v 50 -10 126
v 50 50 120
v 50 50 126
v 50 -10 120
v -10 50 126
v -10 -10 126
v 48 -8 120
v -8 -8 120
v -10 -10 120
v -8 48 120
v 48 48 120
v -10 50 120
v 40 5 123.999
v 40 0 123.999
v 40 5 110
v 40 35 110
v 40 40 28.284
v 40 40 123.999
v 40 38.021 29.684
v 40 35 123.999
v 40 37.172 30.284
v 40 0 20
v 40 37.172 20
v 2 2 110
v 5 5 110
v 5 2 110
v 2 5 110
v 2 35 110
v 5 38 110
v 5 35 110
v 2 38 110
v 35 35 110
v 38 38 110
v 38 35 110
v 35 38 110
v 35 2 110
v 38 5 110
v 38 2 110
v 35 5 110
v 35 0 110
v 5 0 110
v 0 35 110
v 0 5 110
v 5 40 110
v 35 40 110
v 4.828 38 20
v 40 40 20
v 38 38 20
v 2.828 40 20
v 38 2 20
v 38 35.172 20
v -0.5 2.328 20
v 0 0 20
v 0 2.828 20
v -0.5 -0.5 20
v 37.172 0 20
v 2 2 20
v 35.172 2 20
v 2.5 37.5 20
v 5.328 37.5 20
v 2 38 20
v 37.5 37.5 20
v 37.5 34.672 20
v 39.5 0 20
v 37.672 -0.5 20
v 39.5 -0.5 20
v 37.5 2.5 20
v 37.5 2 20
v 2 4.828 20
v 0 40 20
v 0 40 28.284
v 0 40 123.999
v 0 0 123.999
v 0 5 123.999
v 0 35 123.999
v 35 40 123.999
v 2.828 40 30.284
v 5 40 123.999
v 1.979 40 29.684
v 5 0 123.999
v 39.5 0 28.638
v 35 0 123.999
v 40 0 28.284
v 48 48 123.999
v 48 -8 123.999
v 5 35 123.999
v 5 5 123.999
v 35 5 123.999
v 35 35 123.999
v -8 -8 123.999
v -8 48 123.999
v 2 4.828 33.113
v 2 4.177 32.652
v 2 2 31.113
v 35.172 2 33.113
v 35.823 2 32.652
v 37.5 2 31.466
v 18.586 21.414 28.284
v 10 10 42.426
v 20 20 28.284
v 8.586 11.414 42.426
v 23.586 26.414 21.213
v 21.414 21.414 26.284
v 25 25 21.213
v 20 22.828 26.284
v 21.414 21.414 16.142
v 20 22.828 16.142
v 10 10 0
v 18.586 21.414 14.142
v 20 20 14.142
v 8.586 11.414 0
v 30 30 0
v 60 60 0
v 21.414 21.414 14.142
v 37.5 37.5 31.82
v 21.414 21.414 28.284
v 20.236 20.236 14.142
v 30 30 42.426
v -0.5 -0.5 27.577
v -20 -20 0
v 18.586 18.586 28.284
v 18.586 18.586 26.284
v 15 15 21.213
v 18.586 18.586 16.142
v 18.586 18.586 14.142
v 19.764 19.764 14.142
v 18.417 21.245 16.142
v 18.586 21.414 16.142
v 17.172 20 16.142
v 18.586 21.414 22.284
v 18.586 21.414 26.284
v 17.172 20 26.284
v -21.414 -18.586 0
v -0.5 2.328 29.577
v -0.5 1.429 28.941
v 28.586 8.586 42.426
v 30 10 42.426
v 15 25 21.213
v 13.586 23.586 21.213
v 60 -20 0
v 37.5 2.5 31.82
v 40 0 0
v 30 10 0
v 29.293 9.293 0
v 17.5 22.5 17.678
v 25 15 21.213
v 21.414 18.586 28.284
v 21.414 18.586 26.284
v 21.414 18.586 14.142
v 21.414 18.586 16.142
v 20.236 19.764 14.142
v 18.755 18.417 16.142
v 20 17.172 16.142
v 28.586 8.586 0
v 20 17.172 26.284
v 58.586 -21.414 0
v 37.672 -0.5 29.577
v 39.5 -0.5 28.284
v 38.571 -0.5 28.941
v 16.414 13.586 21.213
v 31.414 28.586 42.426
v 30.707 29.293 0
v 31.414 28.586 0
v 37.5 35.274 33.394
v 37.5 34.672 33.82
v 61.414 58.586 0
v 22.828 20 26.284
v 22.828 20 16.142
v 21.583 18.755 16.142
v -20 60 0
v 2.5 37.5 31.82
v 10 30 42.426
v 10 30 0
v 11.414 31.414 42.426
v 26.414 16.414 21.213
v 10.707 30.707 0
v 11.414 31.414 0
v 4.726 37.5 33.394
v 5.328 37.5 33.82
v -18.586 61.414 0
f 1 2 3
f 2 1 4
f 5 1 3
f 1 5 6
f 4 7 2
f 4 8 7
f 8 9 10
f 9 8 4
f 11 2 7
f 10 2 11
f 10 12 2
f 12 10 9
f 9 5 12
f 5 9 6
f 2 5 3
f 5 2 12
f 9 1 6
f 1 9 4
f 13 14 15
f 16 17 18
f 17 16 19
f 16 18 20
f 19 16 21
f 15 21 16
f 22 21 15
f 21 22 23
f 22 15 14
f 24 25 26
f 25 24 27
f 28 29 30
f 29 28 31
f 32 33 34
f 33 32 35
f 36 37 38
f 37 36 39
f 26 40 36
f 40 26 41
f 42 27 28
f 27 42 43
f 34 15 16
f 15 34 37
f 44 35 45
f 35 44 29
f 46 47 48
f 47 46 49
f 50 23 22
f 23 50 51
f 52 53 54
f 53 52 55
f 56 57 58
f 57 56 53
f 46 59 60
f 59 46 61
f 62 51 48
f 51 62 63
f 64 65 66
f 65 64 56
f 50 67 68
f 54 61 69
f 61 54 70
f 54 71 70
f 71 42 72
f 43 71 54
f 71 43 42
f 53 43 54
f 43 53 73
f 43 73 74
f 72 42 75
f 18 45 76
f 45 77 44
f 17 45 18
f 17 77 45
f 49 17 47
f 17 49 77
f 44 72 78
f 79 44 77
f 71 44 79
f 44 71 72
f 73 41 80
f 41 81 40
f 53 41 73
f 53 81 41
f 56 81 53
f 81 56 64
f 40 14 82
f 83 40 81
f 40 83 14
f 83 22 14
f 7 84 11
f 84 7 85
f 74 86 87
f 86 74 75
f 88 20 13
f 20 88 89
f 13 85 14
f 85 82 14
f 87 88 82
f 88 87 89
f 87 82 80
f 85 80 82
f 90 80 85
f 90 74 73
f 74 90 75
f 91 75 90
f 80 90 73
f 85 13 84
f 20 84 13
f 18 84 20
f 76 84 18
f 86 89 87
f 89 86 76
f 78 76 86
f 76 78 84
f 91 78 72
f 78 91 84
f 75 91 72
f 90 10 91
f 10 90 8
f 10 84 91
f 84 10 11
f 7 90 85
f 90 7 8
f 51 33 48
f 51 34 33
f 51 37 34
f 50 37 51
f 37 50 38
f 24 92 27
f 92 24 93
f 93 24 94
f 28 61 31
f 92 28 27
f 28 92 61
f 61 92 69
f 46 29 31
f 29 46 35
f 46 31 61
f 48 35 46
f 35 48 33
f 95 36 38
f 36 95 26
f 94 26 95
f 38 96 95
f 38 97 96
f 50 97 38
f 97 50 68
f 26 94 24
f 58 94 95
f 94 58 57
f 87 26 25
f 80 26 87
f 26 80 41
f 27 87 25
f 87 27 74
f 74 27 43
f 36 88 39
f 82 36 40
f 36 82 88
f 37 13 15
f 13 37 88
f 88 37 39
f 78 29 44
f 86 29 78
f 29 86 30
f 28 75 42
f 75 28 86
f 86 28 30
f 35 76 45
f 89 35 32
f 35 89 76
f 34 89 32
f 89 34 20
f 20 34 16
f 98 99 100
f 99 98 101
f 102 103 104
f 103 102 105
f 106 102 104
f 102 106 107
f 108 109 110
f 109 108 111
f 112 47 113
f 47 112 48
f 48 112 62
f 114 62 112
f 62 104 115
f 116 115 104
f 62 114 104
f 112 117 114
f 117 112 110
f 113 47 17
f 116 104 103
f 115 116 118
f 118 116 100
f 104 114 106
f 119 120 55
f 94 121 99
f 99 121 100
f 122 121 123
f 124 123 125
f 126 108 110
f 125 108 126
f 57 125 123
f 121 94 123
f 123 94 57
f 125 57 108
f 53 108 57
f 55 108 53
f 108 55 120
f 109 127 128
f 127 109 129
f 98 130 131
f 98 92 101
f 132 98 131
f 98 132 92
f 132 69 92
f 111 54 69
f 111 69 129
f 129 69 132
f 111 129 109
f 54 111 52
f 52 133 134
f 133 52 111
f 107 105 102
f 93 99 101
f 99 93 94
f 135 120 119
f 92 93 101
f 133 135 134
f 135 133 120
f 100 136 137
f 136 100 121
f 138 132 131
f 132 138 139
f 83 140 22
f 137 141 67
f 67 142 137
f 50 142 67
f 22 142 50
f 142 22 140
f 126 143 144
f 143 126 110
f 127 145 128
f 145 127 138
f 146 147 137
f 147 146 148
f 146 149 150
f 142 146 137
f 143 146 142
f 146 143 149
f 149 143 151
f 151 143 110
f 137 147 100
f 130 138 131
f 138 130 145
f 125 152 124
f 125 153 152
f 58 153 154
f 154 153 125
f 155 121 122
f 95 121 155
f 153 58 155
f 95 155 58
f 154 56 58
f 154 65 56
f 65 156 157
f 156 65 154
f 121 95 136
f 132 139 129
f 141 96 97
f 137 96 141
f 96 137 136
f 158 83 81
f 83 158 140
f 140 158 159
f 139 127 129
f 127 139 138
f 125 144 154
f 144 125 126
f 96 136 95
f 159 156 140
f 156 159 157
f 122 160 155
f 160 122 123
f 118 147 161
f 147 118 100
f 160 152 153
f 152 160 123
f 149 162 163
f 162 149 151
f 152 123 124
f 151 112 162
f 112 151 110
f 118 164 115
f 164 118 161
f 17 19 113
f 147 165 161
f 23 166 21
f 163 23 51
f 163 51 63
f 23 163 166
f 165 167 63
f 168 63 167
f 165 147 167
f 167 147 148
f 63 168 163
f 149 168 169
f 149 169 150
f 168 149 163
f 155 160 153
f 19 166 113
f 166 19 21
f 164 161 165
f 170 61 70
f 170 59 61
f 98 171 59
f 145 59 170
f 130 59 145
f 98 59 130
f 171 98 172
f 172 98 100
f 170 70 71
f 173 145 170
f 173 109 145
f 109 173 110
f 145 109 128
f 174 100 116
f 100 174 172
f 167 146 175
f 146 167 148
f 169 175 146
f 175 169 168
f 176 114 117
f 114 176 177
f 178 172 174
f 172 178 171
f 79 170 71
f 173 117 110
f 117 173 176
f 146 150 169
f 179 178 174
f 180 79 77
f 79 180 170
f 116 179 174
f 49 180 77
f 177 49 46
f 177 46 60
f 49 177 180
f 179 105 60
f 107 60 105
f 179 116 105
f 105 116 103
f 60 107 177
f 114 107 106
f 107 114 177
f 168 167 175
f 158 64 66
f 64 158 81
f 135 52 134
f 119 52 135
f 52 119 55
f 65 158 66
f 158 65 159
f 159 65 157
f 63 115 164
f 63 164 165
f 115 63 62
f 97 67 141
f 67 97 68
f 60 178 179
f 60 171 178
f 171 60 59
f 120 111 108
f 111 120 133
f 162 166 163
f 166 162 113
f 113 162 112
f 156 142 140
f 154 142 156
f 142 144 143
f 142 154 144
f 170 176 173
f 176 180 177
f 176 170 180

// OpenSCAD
//
// ktRack24
//
//


gap1 = 0.001;
gap2 = 0.002;

th = 2;





translate([0, 0, 20]) A();
B();
//translate([10, 10, 30]) UNIT();

module A()
{
difference()
{
    union()
    {
        translate([-10, -10, 100]) cube([60, 60, th*3]);
        cube([40, 40, 90]);
    }
    translate([-10+th, -10+th, 100-gap1]) cube([60-th*2, 60-th*2, th*2]);
    translate([th, th, -10]) cube([40-th*2, 40-th*2, 105]);
}        
        translate([0, 0, 90]) cube([5, 5, 10+th*3]);
        translate([40-5, 0, 90]) cube([5, 5, 10+th*3]);
        translate([0, 40-5, 90]) cube([5, 5, 10+th*3]);
        translate([40-5, 40-5, 90]) cube([5, 5, 10+th*3]);
}

module B()
{
difference()
{
    union()
    {
        translate([-20, -20, 0]) rotate([0, 45, 45]) cube([30, th, 60]);
        translate([40+20, -20, 0]) rotate([0, 45, 90+45]) cube([30, th, 60]);
        translate([40+20, 40+20, 0]) rotate([0, 45, 180+45]) cube([30, th, 60]);
        translate([-20, 40+20, 0]) rotate([0, 45, 270+45]) cube([30, th, 60]);
    }
    translate([-250, -250, -500]) cube([500, 500, 500]);
    
    translate([-1/2, -1/2, 20]) A();

}
}

module WAKU()
{
difference()
{    union()
    {
        cube([40, 40, 90]);
    }
    translate([th+1, th+1, -10]) cube([40-(th+1)*2, 40-(th+1)*2, 105]);
}
}

module LEFT()
{
difference()
{
    union()
    {
        translate([0, 0, 50-2-5]) rotate([16, 0, 0]) cube([25, 207, 10]);
        translate([0, 0, 50-2-5]) rotate([18, 0, 0]) cube([25, 5, 20]);
        translate([0, 0, 0]) cube([10, 10, 50+5-5]);
        translate([0, 180, 0]) rotate([0, 0, 0]) cube([10, 10, 105]);
        translate([0, 0, 0]) cube([10, 190, 10]);
        translate([0, 58, 55-6]) cube([10, 10, 20]);
        //translate([0, 58+10, 55-6]) cube([25, 10, 20]);
        //translate([0, 58-10, 55-6]) cube([25, 10, 12]);
        //translate([0, 58, 55-6+10]) cube([25, 10, 10]);
        
        translate([0, 160, 82-4]) cube([10, 10, 20]);
        //translate([0, 160+10, 82-4]) cube([25, 20, 20]);
        //translate([0, 160-10, 82-4]) cube([25, 10, 12]);
        //translate([0, 160, 82-4+10]) cube([25, 10, 10]);
        
        //translate([0+10, 180, 50+10]) cube([15, 10, 20]);
        //translate([0+10, 180, 50-10]) cube([15, 10, 10]);
        //translate([0, 180-10, 50-10]) cube([25, 10, 40]);
    }
    
    translate([6, 58+10/2, 55-6+10/2]) rotate([0, 90, 0]) rear_screw_hole();
    translate([6, 160+10/2, 82-4+10/2]) rotate([0, 90, 0]) rear_screw_hole();
    translate([6, 180+10/2, 50+10/2]) rotate([0, 90, 0]) rear_screw_hole();
    
    translate([0, -10, 50-2-5]) rotate([60, 0, 0]) cube([25, 30, 20]);
    translate([0, 180+10, 0]) rotate([0, 0, 0]) cube([25, 10, 115]);
    
    translate([10, -10, 50-2-20]) cube([25, 150, 20]);
}
}



module UNIT()
{
    cube([27+1,20+1, 66+1,]);
}



module screw_hole()
{
    cylinder( 10, 1.6, 1.6, $fn=30 );
    translate( [0, 0, 1.5] ) cylinder( 10, 6.5/2+0.1, 6.5/2+0.1, $fn=6 );
}
module screw_hole2()
{
    translate([0, 0, -5]) cylinder( 20, 1.6, 1.6, $fn=30 );
    translate( [0, 0, 1.5] ) cylinder( 3, 6.5/2+0.1, 6.5/2+0.1, $fn=6 );
}


module rear_screw_hole()
{
    translate([0, 0, 3]) cylinder(5, 1.5, 1.5, $fn=30);
    translate([0, 0, 2.2-gap1]) cylinder(0.8+gap2, 1.5+0.7, 1.5, $fn=30);
    translate([0, 0, -gap1]) cylinder(2.2+gap1, 3.25+0.4, 3.25-0.6, $fn=30);
    translate([0, 0, -10]) cylinder(10, 3.25+0.4, 3.25+0.4, $fn=30);
}
